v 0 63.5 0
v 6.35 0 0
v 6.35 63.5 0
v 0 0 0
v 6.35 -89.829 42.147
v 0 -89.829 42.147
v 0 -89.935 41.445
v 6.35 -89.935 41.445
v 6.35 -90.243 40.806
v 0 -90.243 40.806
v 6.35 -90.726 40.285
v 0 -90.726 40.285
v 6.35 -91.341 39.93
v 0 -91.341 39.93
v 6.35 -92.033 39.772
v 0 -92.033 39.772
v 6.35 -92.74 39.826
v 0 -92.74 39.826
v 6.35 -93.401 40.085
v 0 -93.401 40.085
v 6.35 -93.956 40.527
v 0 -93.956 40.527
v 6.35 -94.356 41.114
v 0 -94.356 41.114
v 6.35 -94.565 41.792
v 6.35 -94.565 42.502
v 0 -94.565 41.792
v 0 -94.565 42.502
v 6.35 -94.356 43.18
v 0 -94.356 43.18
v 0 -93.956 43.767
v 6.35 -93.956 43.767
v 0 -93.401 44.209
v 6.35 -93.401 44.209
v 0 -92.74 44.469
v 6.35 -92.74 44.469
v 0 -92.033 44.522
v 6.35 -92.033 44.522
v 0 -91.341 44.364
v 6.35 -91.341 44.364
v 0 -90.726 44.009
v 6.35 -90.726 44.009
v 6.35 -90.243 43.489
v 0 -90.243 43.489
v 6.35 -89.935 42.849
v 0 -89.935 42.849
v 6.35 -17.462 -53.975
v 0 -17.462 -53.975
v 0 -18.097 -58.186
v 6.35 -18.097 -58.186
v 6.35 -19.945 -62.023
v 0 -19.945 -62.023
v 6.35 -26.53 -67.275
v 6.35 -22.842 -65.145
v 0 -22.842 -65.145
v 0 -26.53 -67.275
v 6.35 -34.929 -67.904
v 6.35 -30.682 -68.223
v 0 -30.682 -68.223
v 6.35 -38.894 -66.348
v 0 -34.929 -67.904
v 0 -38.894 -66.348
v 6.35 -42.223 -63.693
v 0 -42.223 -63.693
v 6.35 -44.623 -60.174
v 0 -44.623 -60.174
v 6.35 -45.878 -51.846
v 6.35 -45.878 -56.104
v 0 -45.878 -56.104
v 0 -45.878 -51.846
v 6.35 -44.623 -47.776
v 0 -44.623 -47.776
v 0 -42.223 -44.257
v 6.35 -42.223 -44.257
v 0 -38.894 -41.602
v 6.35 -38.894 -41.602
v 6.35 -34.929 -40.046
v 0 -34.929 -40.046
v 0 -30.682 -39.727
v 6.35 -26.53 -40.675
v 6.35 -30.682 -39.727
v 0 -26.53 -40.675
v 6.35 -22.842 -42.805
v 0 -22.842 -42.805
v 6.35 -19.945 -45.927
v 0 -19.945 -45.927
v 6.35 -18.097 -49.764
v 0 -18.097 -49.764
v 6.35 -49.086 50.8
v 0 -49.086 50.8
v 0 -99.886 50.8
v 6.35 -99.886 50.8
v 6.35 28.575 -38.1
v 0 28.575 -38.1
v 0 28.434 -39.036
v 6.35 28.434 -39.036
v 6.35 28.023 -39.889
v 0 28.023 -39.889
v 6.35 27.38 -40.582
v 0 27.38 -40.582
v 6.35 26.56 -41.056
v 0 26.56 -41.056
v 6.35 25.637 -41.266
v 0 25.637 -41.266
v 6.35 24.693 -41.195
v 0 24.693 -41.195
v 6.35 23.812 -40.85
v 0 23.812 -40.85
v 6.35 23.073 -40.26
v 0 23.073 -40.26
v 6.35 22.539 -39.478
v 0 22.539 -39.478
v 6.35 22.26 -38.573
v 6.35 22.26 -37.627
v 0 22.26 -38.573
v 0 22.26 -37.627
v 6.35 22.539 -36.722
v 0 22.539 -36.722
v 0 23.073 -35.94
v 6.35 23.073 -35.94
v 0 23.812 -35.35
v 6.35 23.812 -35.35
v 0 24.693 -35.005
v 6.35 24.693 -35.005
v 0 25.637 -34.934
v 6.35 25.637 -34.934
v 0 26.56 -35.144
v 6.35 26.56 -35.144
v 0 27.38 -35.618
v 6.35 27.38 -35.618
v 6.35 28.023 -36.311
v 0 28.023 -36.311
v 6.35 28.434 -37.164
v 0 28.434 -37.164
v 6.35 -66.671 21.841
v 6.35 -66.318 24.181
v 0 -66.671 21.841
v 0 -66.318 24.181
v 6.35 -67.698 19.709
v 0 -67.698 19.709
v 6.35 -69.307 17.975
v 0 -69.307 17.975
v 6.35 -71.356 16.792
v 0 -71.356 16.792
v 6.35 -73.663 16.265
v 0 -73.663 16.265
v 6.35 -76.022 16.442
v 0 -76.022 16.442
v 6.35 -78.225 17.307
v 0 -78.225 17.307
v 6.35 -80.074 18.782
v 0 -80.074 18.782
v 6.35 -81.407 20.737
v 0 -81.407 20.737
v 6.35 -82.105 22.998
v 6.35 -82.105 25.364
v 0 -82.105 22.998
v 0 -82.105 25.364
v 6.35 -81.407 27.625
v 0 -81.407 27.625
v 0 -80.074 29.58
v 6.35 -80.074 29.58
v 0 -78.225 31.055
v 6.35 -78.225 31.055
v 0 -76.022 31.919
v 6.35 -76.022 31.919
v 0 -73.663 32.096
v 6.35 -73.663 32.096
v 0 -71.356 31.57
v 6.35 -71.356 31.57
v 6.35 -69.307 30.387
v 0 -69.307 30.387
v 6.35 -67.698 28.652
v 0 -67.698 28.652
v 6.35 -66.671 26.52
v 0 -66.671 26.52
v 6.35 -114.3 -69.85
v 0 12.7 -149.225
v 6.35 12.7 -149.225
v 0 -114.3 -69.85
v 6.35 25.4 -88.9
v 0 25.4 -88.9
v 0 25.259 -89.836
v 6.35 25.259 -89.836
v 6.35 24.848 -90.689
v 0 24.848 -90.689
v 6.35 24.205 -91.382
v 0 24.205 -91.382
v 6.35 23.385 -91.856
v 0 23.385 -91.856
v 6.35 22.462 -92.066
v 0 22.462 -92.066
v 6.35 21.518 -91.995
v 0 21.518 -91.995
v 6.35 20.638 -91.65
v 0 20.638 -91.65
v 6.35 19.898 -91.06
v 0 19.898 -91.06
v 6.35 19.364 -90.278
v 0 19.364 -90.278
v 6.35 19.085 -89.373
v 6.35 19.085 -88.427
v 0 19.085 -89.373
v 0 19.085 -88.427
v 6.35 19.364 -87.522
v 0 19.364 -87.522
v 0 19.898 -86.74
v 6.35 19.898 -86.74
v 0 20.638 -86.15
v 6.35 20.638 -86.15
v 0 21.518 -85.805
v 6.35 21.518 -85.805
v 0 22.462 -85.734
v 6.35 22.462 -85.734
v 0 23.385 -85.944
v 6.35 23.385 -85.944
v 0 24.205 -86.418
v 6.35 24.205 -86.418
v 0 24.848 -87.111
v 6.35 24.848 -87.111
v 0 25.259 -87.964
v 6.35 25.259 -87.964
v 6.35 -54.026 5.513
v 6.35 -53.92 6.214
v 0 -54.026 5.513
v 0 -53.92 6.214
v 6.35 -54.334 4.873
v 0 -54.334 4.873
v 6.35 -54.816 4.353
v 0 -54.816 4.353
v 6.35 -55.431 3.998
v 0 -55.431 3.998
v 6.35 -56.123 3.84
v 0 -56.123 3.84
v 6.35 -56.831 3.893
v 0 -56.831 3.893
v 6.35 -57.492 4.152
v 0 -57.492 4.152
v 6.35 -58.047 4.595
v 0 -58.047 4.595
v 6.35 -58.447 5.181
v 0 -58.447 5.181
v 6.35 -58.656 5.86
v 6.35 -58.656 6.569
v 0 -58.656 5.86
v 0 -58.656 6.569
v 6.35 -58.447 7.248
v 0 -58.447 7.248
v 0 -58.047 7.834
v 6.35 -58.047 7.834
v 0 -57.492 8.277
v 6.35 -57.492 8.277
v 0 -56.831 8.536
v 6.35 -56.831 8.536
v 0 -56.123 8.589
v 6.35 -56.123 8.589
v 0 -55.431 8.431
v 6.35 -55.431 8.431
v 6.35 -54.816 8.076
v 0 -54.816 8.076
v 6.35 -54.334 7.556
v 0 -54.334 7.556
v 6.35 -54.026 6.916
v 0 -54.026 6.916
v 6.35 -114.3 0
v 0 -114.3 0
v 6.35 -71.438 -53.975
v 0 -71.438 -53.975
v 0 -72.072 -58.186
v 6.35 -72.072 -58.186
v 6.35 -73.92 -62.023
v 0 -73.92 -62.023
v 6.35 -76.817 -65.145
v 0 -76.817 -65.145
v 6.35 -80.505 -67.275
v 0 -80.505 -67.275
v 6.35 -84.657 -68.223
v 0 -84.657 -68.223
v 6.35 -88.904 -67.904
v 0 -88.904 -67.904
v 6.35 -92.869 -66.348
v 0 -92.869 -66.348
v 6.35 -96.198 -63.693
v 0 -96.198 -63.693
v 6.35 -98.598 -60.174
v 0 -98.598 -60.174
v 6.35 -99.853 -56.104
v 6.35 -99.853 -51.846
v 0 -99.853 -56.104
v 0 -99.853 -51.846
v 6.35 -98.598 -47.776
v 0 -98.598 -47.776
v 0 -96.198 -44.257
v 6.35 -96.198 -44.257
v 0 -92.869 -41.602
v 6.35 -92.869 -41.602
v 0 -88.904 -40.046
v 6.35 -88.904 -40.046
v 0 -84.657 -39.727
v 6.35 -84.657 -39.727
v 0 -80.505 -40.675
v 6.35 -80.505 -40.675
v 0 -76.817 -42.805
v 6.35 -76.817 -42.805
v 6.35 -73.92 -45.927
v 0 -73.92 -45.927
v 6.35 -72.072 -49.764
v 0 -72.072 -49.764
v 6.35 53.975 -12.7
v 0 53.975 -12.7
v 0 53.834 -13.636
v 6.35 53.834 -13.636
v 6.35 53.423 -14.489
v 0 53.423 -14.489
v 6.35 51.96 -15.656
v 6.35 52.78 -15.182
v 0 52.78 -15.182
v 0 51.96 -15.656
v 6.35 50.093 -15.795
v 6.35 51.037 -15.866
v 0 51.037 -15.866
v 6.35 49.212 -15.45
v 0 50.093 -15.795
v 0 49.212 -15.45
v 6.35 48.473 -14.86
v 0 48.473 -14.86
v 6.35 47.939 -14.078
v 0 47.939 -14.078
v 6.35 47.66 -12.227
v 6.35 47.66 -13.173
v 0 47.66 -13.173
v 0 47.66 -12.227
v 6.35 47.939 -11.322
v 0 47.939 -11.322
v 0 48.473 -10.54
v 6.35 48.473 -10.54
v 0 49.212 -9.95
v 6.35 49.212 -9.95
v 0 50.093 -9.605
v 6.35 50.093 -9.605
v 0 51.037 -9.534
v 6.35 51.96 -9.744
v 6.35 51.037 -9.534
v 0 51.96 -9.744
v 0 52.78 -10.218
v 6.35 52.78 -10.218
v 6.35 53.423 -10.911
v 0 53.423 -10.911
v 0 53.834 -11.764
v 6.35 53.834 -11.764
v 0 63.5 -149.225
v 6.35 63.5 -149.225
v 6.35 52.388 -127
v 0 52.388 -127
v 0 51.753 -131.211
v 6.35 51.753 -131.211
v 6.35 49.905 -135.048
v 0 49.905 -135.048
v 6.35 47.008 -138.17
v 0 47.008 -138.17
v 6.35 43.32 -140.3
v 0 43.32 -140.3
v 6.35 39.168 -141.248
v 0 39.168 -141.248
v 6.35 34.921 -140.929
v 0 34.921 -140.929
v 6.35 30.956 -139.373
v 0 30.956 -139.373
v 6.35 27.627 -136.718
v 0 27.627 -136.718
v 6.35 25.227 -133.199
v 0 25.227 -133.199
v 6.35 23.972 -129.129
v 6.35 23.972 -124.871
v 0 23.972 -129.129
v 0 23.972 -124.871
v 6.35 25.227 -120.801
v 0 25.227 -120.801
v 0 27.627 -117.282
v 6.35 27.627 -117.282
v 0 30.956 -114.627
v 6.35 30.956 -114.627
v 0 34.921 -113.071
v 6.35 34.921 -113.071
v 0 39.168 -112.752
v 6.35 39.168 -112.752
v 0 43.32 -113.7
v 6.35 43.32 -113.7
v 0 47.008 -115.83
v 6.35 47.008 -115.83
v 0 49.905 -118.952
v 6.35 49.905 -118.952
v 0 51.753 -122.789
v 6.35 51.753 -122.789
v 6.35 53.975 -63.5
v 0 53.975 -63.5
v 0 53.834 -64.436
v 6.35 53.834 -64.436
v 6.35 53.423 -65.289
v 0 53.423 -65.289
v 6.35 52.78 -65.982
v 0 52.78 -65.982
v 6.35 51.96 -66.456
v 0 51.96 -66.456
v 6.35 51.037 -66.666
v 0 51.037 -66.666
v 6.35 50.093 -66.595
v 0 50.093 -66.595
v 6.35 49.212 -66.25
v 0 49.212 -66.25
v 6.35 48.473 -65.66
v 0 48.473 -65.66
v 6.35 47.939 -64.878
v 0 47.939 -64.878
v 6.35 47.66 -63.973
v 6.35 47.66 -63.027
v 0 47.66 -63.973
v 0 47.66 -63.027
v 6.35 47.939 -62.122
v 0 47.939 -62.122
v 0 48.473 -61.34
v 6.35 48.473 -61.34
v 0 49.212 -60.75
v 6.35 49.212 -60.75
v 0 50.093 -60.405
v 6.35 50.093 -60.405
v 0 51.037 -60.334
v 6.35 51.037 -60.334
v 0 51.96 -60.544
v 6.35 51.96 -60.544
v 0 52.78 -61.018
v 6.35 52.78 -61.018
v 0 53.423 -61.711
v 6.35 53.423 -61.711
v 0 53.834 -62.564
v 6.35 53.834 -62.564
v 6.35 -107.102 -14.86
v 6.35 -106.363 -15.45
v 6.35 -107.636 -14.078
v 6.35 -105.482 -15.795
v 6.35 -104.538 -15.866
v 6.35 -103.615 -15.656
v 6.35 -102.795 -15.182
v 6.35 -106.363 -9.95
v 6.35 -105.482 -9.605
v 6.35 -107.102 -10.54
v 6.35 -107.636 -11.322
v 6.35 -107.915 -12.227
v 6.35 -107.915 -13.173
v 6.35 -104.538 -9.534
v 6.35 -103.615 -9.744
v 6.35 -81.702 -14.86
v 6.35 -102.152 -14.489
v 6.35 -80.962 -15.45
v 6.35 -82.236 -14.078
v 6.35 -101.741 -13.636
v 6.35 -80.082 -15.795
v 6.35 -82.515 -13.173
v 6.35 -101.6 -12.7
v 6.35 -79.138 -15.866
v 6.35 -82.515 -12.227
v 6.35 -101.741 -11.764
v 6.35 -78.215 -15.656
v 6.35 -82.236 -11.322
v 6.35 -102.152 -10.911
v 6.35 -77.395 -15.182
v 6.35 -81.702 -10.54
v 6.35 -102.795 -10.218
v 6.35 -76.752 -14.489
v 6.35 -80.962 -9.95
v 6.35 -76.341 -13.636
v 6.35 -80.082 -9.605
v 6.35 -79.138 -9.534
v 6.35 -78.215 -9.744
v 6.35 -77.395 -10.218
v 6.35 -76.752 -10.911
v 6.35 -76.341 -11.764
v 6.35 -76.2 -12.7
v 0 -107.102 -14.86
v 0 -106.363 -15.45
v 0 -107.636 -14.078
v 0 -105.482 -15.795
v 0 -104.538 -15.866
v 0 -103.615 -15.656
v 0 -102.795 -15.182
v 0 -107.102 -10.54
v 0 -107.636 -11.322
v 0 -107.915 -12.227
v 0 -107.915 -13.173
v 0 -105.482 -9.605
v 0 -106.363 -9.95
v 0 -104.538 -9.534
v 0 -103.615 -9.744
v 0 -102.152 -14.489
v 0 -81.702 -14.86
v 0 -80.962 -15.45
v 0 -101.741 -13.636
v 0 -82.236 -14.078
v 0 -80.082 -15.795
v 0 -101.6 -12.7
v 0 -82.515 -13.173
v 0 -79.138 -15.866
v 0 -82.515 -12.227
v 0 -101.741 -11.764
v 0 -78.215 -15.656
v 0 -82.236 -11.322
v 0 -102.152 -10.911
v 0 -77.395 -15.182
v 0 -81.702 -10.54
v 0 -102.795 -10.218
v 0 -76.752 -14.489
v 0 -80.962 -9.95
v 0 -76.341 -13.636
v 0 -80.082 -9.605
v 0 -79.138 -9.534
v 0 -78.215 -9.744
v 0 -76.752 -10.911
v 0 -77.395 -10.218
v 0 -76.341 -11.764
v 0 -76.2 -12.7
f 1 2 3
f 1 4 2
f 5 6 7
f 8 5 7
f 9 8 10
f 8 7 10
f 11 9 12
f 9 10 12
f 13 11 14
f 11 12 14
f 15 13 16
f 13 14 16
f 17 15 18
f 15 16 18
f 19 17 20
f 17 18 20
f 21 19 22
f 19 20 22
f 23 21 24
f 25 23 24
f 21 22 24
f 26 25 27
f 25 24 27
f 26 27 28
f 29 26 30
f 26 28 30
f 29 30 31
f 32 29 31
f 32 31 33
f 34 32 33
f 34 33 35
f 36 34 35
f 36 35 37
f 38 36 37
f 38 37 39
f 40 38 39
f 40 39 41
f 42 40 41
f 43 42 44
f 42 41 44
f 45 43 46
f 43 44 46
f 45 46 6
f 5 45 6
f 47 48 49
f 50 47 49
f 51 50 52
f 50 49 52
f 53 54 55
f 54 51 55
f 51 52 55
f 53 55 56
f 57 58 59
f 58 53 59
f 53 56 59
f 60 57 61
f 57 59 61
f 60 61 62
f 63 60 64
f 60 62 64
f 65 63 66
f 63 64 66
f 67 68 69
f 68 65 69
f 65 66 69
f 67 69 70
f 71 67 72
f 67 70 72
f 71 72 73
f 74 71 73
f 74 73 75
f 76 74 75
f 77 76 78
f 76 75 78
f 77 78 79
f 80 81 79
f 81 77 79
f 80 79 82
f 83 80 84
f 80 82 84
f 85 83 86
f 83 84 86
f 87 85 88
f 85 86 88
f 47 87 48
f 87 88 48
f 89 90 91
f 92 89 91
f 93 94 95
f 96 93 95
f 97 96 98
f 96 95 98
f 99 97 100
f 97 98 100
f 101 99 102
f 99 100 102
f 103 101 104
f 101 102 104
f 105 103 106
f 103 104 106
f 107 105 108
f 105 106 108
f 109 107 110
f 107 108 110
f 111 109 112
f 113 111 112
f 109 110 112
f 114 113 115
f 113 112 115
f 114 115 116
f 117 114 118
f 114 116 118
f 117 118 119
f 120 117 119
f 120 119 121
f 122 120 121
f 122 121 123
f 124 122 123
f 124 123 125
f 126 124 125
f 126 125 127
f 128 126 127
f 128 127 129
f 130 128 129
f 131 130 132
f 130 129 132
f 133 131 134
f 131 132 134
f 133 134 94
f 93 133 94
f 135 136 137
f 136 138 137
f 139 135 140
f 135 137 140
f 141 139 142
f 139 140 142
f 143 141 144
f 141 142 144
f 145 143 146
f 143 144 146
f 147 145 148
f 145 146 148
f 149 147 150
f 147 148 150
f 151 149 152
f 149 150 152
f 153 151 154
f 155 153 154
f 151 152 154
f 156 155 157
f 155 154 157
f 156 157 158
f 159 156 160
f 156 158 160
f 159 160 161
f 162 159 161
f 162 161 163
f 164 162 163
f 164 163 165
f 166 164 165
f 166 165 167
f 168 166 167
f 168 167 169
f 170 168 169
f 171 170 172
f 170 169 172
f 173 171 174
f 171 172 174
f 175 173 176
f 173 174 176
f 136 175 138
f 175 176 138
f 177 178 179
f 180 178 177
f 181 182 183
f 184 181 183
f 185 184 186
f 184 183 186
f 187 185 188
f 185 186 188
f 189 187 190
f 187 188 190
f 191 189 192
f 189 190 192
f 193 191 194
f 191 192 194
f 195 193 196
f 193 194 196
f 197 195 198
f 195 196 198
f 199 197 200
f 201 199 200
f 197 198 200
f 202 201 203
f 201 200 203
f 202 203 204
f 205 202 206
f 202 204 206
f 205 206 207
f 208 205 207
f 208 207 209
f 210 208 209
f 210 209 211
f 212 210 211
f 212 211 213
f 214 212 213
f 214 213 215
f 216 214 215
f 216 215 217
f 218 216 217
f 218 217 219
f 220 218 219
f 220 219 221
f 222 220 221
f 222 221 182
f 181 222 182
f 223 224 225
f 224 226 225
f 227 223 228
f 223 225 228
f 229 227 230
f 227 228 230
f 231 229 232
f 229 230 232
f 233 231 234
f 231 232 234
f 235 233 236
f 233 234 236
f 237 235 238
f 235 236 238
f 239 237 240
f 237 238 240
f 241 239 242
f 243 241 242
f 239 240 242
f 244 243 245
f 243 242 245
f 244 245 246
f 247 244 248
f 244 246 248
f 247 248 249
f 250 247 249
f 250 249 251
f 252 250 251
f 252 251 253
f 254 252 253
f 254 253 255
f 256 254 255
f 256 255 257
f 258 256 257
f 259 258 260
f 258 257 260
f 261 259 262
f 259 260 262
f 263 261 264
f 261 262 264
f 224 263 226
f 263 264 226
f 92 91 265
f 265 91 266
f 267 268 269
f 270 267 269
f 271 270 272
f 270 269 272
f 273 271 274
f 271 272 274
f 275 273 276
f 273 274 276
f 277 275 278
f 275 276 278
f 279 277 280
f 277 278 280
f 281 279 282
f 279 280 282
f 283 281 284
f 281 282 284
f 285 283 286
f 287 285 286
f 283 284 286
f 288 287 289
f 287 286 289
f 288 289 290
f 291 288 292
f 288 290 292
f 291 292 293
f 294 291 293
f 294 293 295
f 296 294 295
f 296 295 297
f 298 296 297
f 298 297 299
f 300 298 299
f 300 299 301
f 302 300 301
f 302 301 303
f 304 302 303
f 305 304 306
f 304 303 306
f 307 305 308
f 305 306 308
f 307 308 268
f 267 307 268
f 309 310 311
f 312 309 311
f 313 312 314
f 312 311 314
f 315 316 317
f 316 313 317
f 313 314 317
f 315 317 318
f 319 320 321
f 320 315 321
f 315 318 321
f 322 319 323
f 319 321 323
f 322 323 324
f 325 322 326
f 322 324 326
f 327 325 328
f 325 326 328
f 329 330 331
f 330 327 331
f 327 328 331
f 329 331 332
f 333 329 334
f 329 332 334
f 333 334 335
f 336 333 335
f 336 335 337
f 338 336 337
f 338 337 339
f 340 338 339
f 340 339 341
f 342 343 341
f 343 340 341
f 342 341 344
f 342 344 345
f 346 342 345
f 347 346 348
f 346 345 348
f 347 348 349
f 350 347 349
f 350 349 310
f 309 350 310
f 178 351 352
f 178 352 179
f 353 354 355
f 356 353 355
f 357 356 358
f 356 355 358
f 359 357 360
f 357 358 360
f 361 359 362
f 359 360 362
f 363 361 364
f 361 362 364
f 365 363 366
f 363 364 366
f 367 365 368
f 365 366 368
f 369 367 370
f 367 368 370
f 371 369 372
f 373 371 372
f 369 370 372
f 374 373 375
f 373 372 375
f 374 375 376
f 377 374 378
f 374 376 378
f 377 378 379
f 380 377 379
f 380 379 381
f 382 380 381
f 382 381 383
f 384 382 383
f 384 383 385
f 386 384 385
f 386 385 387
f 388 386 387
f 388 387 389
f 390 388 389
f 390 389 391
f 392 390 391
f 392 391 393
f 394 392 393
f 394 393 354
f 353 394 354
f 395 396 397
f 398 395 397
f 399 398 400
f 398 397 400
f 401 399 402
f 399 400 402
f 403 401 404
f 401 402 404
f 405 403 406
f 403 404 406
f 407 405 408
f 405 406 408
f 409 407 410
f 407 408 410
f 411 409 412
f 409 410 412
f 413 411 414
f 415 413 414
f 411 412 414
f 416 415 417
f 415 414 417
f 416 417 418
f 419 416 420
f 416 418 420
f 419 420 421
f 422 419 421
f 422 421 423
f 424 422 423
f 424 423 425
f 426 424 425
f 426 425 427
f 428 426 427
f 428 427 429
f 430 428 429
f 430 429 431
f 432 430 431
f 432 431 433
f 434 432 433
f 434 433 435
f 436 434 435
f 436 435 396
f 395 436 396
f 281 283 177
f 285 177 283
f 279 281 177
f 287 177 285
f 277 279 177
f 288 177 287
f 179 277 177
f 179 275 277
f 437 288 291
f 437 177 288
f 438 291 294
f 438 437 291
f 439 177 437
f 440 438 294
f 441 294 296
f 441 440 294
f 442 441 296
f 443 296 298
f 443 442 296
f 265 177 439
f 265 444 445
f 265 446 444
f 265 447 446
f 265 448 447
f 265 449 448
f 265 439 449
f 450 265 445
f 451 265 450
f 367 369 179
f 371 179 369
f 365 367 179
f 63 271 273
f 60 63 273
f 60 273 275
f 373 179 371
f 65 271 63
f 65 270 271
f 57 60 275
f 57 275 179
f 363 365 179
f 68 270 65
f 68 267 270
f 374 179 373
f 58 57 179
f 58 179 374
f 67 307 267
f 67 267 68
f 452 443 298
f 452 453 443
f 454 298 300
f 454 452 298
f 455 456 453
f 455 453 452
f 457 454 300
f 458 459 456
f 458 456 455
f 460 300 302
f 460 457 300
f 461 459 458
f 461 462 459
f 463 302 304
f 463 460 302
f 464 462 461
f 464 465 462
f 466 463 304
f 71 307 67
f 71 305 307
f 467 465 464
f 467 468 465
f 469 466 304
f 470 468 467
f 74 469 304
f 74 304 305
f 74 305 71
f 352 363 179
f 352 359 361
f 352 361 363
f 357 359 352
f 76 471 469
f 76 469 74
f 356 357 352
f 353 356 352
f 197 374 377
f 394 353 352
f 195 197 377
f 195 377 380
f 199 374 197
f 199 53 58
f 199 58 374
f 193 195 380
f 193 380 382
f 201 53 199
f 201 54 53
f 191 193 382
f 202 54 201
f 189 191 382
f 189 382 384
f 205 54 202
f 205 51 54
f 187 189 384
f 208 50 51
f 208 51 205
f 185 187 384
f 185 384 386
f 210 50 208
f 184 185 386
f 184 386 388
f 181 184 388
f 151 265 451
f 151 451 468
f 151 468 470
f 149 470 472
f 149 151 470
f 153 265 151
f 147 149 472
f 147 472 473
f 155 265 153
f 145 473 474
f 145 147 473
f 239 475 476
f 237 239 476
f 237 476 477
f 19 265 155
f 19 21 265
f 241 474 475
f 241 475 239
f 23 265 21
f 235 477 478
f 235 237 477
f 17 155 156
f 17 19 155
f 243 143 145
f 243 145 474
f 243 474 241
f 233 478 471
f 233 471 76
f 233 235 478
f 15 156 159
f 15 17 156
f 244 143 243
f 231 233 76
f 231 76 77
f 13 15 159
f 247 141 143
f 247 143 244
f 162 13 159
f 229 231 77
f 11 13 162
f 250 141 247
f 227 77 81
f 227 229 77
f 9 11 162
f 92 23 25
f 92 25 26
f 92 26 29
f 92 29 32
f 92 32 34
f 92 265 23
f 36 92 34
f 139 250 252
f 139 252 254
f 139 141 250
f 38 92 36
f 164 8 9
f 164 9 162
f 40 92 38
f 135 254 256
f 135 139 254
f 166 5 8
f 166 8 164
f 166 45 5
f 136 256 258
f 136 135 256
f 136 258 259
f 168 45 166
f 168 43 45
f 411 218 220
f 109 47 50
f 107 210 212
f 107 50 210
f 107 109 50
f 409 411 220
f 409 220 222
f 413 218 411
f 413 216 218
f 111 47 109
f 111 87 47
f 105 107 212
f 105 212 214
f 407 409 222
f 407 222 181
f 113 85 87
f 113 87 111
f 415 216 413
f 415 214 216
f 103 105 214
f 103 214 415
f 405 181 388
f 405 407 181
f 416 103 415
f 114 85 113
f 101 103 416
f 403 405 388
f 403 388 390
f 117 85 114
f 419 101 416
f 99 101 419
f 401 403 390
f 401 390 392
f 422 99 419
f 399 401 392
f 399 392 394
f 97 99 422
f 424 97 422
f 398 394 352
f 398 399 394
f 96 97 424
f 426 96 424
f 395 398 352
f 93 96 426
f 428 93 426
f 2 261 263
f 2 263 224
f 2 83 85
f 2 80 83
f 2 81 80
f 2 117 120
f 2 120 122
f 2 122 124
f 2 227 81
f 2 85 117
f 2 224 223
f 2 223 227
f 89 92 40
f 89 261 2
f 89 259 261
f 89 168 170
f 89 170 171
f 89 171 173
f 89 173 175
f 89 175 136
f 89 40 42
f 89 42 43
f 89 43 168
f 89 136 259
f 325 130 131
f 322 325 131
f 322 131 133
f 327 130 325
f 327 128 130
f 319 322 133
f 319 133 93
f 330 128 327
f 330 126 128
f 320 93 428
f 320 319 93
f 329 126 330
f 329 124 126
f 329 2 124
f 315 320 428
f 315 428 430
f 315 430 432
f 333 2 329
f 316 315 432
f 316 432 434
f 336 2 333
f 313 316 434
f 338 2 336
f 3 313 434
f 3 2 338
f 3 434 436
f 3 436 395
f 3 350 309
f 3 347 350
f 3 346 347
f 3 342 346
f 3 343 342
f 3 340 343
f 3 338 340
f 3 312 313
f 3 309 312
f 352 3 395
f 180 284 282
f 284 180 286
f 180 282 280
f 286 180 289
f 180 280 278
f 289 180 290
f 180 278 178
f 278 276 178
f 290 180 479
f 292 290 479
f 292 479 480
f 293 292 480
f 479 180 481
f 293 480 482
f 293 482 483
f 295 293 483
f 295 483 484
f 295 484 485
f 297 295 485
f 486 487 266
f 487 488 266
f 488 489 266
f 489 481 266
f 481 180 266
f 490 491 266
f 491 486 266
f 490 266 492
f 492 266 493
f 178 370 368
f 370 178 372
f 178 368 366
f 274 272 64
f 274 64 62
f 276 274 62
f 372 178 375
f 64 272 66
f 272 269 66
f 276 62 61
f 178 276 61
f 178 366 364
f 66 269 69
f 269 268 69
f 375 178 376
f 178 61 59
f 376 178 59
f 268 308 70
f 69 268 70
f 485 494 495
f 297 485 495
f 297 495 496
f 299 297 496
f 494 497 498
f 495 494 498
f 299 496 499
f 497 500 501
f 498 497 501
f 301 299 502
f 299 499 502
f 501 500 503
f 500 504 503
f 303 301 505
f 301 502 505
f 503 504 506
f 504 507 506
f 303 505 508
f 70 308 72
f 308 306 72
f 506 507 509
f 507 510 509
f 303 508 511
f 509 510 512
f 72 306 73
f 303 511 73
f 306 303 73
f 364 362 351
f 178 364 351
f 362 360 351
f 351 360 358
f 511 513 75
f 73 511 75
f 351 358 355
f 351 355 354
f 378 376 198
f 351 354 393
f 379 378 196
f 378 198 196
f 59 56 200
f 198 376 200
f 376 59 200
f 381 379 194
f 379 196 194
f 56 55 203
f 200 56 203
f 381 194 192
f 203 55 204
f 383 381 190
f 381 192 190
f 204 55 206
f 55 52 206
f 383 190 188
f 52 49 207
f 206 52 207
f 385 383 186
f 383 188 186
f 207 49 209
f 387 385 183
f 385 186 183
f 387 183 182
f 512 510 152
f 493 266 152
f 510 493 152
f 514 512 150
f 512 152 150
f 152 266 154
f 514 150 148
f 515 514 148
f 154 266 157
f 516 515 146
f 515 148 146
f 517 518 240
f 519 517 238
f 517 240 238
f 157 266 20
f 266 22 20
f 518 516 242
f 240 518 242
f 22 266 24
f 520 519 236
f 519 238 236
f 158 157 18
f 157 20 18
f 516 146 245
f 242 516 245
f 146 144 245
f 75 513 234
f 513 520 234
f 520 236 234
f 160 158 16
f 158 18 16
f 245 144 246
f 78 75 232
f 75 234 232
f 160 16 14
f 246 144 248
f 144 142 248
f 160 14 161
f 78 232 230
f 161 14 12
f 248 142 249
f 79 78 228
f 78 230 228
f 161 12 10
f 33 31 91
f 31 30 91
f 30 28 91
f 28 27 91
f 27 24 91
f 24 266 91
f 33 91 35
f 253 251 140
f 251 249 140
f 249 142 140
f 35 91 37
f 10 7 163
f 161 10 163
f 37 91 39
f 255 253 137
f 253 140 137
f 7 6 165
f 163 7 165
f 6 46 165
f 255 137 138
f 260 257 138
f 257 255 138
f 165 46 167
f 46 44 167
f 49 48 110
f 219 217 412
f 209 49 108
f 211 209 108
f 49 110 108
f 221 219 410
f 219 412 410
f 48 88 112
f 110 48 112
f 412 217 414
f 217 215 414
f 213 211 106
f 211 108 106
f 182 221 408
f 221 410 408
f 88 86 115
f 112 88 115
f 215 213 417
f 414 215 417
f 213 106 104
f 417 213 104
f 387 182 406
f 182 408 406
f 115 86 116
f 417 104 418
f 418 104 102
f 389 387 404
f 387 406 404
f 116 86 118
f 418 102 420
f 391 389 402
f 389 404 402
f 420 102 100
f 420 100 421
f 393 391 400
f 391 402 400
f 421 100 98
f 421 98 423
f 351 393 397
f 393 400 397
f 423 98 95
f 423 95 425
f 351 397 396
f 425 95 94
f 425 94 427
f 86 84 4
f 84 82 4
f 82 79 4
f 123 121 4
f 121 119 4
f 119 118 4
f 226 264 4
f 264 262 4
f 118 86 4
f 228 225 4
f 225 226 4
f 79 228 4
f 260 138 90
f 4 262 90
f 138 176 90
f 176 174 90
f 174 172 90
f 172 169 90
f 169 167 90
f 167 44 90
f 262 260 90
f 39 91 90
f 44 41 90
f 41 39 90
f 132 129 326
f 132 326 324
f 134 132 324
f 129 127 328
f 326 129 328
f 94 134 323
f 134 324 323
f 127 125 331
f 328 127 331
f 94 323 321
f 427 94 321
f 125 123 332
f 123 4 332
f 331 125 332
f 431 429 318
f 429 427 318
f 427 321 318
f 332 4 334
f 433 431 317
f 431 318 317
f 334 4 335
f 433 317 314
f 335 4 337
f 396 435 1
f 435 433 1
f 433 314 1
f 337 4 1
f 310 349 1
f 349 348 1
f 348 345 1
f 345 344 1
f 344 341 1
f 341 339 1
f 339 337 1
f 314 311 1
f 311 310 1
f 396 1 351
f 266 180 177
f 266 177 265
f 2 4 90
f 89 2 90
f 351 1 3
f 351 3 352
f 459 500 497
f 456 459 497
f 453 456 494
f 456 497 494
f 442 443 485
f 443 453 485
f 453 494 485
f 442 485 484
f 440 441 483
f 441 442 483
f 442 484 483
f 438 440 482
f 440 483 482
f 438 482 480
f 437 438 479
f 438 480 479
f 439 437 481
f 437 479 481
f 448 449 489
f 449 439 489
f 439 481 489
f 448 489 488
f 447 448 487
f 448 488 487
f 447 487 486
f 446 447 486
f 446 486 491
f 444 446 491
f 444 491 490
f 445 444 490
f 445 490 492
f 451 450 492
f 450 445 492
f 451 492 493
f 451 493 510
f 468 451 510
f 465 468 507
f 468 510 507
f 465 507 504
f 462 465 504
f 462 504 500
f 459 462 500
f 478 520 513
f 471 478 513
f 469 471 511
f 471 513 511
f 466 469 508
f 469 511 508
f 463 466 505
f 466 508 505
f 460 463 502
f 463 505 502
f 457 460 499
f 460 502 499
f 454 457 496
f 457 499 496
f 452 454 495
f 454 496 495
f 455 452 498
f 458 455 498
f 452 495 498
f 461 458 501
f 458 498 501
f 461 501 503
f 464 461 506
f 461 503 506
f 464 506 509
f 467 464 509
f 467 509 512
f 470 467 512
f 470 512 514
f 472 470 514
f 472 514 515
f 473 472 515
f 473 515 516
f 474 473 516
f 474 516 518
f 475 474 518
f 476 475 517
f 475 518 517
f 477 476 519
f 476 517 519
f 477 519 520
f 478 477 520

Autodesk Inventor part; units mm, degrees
ref_plane "YZ Plane" through (0, 0, 0) normal (1, 0, 0) x (0, 1, 0)
ref_plane "XZ Plane" through (0, 0, 0) normal (0, 1, 0) x (-1, 0, 0)
ref_plane "XY Plane" through (0, 0, 0) normal (0, 0, 1) x (1, 0, 0)
sketch "Sketch1" plane through (0, 0, 0) normal (1, 0, 0) x (0, 1, 0)
  line L0 (0, 0) -> (63.5, 0)
  line L1 (63.5, 0) -> (63.5, -149.225)
  line L2 (63.5, -149.225) -> (12.7, -149.225)
  circle A0 centre (-31.75, -53.975) radius 14.2875
  line L3 (63.5, -25.4) -> (-43.502, -25.4) construction
  circle A1 centre (50.8, -12.7) radius 3.175
  circle A2 centre (-104.775, -12.7) radius 3.175
  line L4 (12.7, -149.225) -> (-114.3, -69.85)
  line L5 (-114.3, -69.85) -> (-114.3, 0)
  line L6 (-114.3, 0) -> (0, 0) construction
  circle A3 centre (-85.725, -53.975) radius 14.2875
  line L7 (-53.2384, 0) -> (-95.25, 0)
  line L8 (-95.25, 0) -> (-95.25, 45.1866) construction
  line L9 (-95.25, 45.1866) -> (-53.2384, 45.1866) construction
  line L10 (-53.2384, 45.1866) -> (-53.2384, 0) construction
  line L11 (-95.25, 45.1866) -> (-114.3, 0) construction
  line L12 (-53.2384, 45.1866) -> (0, 0) construction
  circle A4 centre (-56.3011, 6.2145) radius 2.3813
  circle A5 centre (-92.2105, 42.1471) radius 2.3813
  line L13 (0, 0) -> (-49.0855, 50.8)
  line L14 (-49.0855, 50.8) -> (-99.8855, 50.8)
  line L15 (-99.8855, 50.8) -> (-114.3, 0)
  circle A6 centre (-74.2558, 24.1808) radius 7.9375
  line L16 (-92.2105, 42.1471) -> (-74.2558, 24.1808) construction
  line L17 (-74.2558, 24.1808) -> (-56.3011, 6.2145) construction
  circle A7 centre (38.1, -127) radius 14.2875
  circle A8 centre (22.225, -88.9) radius 3.175
  circle A9 centre (50.8, -63.5) radius 3.175
  circle A10 centre (25.4, -38.1) radius 3.175
  circle A11 centre (-79.375, -12.7) radius 3.175
  dimension "d1" = 28.575
  dimension "d2" = 63.5
  dimension "d6" = 25.4
  dimension "d7" = 6.35
  dimension "d8" = 6.35
  dimension "d9" = 12.7
  dimension "d10" = 12.7
  dimension "d12" = 12.7
  dimension "d17" = 50.8
  dimension "d18" = 114.3
  dimension "d19" = 9.525
  dimension "d20" = 53.975
  dimension "d21" = 28.575
  dimension "d24" = 53.975
  dimension "d25" = 69.85
  dimension "d26" = 53.975
  dimension "d27" = 149.225
  dimension "d28" = 107.002
  dimension "d29" = 42.0116
  dimension "d30" = 19.05
  dimension "d31" = 45.1866
  dimension "d32" = 50.8
  dimension "d33" = 4.7625
  dimension "d34" = 3.0395
  dimension "d35" = 3.0395
  dimension "d36" = 6.2145
  dimension "d37" = 50.8
  dimension "d38" = 50.8
  dimension "d39" = 4.1529
  dimension "d40" = 15.875
  dimension "d42" = 22.225
  dimension "d43" = 25.4
  dimension "d44" = 28.575
  dimension "d45" = 6.35
  dimension "d46" = 6.35
  dimension "d47" = 6.35
  dimension "d48" = 38.1
  dimension "d49" = 38.1
  dimension "d50" = 41.275
  dimension "d51" = 12.7
  dimension "d52" = 63.5
  dimension "d53" = 88.9
  dimension "d54" = 6.35
  dimension "d55" = 12.7
  dimension "d56" = 25.4
extrude "Extrusion1" add sketch "Sketch1" along normal blind 6.35 contours L0 L1 L2 L4 L5 L15 L14 L13 | A3 | A4 | A5 | A6 | A7 | A8 | A9 | A10 | A11
extrude "Extrusion2" cut sketch "Sketch1" along normal blind 25.4 contours A3 | A4 | A5 | A6 | A7 | A8 | A9 | A10 | A11
equation "\"BendRadius\" = Thickness"
equation "\"BendReliefWidth\" = Thickness"
equation "\"BendReliefDepth\" = 0.5 * Thickness"
equation "\"CornerReliefSize\" = 4 * Thickness"
equation "\"MinimumRemnant\" = 2 * Thickness"
equation "\"TransitionRadius\" = BendRadius"
equation "\"JacobiRadiusSize\" = Thickness"
equation "\"GapSize\" = Thickness"
equation "\"Thickness\" = 3.048"
properties part number "15102898-16-P-0302" material "Aluminum 6061"
